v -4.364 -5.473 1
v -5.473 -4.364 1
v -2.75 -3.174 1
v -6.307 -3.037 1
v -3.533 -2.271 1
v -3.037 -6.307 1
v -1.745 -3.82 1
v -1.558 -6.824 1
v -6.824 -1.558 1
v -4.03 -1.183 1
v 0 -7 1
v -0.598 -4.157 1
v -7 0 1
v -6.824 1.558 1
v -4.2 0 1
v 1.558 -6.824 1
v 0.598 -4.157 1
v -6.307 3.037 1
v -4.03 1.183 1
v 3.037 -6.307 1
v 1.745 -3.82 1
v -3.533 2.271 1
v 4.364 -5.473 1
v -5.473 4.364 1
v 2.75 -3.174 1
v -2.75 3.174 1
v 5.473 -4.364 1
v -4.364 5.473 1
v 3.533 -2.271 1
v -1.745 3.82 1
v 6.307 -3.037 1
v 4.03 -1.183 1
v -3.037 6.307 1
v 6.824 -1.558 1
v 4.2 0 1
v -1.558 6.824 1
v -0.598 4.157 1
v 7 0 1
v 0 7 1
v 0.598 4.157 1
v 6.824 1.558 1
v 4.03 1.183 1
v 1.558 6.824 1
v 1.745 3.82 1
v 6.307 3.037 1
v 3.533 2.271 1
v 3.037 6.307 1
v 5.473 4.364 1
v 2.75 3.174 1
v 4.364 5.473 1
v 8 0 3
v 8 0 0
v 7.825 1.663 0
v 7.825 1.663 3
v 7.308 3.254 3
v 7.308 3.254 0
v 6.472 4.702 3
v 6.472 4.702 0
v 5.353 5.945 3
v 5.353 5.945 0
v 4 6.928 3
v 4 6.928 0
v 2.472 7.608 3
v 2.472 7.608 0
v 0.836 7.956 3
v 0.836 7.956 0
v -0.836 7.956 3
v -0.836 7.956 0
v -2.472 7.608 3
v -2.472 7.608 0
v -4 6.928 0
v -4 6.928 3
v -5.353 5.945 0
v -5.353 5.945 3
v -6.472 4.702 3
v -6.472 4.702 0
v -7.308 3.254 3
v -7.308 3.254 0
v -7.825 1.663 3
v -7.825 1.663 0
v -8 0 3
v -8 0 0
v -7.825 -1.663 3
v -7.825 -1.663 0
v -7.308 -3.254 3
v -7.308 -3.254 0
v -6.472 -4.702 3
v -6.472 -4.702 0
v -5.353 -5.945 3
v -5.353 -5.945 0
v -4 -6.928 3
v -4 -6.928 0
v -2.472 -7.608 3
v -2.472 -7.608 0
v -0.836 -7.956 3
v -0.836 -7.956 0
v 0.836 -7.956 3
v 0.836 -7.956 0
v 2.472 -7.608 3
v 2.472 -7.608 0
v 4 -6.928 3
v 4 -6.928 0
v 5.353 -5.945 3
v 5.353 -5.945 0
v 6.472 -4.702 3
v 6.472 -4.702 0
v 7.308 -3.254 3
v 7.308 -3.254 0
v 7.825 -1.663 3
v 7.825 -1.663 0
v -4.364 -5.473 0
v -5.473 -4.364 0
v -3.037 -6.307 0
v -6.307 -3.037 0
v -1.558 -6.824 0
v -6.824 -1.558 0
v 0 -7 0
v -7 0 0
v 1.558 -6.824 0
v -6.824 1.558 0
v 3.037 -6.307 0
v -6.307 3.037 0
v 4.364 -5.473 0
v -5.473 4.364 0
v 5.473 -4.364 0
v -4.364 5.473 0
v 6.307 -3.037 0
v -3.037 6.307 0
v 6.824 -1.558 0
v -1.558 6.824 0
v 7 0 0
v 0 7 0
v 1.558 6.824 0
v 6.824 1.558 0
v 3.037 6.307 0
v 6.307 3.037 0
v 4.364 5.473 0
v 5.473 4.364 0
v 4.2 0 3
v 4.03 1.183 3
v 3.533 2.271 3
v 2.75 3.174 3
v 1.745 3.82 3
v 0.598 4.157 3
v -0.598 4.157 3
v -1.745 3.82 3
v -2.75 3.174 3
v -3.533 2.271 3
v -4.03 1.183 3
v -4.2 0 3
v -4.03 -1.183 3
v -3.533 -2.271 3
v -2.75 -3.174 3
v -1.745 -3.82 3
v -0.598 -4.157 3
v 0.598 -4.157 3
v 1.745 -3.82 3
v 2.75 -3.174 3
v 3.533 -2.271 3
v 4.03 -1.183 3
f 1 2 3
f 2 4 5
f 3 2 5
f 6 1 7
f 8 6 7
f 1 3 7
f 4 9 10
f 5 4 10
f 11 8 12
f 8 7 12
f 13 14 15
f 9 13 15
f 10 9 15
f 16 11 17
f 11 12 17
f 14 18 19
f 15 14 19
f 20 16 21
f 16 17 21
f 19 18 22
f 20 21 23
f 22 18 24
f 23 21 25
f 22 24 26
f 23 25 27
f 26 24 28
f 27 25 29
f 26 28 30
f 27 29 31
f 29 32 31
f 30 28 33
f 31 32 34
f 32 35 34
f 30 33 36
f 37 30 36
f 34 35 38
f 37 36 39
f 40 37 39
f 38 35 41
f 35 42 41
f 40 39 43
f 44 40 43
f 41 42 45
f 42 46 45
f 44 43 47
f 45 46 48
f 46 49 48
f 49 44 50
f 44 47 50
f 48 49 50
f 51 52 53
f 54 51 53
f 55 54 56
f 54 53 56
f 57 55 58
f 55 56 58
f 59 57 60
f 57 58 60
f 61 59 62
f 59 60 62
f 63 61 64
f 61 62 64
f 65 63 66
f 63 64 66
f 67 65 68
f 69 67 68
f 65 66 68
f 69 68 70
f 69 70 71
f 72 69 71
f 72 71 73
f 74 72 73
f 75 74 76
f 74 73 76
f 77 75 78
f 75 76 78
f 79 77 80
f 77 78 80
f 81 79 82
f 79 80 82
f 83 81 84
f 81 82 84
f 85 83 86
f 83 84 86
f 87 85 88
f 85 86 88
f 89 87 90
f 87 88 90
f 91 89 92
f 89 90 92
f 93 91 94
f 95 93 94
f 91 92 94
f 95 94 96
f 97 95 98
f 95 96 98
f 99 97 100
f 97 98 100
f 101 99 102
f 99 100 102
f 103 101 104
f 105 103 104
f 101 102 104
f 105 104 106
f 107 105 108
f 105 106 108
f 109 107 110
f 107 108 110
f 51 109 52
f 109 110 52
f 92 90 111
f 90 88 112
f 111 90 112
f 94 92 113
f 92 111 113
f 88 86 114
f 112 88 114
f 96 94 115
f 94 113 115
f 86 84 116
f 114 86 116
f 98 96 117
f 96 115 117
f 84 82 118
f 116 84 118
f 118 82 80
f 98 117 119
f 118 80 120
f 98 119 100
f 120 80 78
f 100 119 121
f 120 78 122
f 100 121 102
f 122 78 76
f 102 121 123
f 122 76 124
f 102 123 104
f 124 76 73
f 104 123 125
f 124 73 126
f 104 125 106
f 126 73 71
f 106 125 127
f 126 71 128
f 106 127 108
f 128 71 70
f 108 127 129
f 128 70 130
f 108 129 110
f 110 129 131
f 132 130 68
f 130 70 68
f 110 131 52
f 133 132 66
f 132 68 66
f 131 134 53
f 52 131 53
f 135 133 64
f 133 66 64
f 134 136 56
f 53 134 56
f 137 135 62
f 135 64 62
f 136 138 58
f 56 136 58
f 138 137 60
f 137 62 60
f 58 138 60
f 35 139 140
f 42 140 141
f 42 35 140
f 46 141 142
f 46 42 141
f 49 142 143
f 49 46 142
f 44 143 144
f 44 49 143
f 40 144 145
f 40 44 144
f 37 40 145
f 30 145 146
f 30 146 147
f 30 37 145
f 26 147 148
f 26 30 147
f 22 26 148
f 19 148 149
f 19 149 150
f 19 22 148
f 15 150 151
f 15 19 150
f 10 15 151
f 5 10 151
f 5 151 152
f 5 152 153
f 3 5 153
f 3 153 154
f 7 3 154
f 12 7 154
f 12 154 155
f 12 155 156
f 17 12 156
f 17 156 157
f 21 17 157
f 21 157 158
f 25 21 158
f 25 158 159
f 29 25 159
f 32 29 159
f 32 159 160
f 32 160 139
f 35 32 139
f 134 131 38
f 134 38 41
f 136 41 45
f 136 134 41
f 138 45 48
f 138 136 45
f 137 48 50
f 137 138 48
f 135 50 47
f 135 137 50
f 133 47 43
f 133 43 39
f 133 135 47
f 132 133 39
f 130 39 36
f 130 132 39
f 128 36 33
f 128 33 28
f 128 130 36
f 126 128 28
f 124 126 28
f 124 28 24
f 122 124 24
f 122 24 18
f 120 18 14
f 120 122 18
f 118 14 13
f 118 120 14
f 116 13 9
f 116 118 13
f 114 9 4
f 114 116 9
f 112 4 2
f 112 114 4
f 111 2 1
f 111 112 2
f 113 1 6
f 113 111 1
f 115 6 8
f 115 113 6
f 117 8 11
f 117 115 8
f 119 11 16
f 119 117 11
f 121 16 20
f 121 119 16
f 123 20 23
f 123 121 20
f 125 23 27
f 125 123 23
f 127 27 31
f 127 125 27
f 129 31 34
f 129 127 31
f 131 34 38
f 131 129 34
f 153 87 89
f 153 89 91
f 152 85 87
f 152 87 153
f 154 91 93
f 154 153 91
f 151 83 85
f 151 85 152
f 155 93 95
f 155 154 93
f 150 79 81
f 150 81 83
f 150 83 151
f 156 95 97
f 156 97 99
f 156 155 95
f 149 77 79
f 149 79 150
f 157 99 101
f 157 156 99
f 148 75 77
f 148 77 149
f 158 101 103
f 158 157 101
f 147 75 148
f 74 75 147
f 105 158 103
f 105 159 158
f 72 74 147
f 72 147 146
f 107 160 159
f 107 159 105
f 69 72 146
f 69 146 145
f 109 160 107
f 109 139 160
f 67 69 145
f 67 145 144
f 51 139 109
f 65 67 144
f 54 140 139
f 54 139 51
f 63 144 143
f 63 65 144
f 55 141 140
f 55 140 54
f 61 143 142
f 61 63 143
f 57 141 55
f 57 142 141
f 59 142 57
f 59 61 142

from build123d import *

# Parameters (mm, degrees)
CYLINDER014005855_R     = 7
CYLINDER014005855_DEPTH = 1
TUBE004_R               = 8
TUBE004_R_2             = 4.2
TUBE004_DEPTH           = 3


with BuildPart() as v_lec768:
    # Cylinder014005855 → Cylinder014005855 (new body)
    with BuildSketch(Plane.XY):
        Circle(CYLINDER014005855_R)
    extrude(amount=CYLINDER014005855_DEPTH)


with BuildPart() as ring:
    # Tube004 → Tube004 (new body)
    with BuildSketch(Plane.XY):
        Circle(TUBE004_R)
        Circle(TUBE004_R_2, mode=Mode.SUBTRACT)
    extrude(amount=TUBE004_DEPTH)

    # Cut009003003007: cut Válec768
    add(v_lec768.part, mode=Mode.SUBTRACT)


solid = ring.part
